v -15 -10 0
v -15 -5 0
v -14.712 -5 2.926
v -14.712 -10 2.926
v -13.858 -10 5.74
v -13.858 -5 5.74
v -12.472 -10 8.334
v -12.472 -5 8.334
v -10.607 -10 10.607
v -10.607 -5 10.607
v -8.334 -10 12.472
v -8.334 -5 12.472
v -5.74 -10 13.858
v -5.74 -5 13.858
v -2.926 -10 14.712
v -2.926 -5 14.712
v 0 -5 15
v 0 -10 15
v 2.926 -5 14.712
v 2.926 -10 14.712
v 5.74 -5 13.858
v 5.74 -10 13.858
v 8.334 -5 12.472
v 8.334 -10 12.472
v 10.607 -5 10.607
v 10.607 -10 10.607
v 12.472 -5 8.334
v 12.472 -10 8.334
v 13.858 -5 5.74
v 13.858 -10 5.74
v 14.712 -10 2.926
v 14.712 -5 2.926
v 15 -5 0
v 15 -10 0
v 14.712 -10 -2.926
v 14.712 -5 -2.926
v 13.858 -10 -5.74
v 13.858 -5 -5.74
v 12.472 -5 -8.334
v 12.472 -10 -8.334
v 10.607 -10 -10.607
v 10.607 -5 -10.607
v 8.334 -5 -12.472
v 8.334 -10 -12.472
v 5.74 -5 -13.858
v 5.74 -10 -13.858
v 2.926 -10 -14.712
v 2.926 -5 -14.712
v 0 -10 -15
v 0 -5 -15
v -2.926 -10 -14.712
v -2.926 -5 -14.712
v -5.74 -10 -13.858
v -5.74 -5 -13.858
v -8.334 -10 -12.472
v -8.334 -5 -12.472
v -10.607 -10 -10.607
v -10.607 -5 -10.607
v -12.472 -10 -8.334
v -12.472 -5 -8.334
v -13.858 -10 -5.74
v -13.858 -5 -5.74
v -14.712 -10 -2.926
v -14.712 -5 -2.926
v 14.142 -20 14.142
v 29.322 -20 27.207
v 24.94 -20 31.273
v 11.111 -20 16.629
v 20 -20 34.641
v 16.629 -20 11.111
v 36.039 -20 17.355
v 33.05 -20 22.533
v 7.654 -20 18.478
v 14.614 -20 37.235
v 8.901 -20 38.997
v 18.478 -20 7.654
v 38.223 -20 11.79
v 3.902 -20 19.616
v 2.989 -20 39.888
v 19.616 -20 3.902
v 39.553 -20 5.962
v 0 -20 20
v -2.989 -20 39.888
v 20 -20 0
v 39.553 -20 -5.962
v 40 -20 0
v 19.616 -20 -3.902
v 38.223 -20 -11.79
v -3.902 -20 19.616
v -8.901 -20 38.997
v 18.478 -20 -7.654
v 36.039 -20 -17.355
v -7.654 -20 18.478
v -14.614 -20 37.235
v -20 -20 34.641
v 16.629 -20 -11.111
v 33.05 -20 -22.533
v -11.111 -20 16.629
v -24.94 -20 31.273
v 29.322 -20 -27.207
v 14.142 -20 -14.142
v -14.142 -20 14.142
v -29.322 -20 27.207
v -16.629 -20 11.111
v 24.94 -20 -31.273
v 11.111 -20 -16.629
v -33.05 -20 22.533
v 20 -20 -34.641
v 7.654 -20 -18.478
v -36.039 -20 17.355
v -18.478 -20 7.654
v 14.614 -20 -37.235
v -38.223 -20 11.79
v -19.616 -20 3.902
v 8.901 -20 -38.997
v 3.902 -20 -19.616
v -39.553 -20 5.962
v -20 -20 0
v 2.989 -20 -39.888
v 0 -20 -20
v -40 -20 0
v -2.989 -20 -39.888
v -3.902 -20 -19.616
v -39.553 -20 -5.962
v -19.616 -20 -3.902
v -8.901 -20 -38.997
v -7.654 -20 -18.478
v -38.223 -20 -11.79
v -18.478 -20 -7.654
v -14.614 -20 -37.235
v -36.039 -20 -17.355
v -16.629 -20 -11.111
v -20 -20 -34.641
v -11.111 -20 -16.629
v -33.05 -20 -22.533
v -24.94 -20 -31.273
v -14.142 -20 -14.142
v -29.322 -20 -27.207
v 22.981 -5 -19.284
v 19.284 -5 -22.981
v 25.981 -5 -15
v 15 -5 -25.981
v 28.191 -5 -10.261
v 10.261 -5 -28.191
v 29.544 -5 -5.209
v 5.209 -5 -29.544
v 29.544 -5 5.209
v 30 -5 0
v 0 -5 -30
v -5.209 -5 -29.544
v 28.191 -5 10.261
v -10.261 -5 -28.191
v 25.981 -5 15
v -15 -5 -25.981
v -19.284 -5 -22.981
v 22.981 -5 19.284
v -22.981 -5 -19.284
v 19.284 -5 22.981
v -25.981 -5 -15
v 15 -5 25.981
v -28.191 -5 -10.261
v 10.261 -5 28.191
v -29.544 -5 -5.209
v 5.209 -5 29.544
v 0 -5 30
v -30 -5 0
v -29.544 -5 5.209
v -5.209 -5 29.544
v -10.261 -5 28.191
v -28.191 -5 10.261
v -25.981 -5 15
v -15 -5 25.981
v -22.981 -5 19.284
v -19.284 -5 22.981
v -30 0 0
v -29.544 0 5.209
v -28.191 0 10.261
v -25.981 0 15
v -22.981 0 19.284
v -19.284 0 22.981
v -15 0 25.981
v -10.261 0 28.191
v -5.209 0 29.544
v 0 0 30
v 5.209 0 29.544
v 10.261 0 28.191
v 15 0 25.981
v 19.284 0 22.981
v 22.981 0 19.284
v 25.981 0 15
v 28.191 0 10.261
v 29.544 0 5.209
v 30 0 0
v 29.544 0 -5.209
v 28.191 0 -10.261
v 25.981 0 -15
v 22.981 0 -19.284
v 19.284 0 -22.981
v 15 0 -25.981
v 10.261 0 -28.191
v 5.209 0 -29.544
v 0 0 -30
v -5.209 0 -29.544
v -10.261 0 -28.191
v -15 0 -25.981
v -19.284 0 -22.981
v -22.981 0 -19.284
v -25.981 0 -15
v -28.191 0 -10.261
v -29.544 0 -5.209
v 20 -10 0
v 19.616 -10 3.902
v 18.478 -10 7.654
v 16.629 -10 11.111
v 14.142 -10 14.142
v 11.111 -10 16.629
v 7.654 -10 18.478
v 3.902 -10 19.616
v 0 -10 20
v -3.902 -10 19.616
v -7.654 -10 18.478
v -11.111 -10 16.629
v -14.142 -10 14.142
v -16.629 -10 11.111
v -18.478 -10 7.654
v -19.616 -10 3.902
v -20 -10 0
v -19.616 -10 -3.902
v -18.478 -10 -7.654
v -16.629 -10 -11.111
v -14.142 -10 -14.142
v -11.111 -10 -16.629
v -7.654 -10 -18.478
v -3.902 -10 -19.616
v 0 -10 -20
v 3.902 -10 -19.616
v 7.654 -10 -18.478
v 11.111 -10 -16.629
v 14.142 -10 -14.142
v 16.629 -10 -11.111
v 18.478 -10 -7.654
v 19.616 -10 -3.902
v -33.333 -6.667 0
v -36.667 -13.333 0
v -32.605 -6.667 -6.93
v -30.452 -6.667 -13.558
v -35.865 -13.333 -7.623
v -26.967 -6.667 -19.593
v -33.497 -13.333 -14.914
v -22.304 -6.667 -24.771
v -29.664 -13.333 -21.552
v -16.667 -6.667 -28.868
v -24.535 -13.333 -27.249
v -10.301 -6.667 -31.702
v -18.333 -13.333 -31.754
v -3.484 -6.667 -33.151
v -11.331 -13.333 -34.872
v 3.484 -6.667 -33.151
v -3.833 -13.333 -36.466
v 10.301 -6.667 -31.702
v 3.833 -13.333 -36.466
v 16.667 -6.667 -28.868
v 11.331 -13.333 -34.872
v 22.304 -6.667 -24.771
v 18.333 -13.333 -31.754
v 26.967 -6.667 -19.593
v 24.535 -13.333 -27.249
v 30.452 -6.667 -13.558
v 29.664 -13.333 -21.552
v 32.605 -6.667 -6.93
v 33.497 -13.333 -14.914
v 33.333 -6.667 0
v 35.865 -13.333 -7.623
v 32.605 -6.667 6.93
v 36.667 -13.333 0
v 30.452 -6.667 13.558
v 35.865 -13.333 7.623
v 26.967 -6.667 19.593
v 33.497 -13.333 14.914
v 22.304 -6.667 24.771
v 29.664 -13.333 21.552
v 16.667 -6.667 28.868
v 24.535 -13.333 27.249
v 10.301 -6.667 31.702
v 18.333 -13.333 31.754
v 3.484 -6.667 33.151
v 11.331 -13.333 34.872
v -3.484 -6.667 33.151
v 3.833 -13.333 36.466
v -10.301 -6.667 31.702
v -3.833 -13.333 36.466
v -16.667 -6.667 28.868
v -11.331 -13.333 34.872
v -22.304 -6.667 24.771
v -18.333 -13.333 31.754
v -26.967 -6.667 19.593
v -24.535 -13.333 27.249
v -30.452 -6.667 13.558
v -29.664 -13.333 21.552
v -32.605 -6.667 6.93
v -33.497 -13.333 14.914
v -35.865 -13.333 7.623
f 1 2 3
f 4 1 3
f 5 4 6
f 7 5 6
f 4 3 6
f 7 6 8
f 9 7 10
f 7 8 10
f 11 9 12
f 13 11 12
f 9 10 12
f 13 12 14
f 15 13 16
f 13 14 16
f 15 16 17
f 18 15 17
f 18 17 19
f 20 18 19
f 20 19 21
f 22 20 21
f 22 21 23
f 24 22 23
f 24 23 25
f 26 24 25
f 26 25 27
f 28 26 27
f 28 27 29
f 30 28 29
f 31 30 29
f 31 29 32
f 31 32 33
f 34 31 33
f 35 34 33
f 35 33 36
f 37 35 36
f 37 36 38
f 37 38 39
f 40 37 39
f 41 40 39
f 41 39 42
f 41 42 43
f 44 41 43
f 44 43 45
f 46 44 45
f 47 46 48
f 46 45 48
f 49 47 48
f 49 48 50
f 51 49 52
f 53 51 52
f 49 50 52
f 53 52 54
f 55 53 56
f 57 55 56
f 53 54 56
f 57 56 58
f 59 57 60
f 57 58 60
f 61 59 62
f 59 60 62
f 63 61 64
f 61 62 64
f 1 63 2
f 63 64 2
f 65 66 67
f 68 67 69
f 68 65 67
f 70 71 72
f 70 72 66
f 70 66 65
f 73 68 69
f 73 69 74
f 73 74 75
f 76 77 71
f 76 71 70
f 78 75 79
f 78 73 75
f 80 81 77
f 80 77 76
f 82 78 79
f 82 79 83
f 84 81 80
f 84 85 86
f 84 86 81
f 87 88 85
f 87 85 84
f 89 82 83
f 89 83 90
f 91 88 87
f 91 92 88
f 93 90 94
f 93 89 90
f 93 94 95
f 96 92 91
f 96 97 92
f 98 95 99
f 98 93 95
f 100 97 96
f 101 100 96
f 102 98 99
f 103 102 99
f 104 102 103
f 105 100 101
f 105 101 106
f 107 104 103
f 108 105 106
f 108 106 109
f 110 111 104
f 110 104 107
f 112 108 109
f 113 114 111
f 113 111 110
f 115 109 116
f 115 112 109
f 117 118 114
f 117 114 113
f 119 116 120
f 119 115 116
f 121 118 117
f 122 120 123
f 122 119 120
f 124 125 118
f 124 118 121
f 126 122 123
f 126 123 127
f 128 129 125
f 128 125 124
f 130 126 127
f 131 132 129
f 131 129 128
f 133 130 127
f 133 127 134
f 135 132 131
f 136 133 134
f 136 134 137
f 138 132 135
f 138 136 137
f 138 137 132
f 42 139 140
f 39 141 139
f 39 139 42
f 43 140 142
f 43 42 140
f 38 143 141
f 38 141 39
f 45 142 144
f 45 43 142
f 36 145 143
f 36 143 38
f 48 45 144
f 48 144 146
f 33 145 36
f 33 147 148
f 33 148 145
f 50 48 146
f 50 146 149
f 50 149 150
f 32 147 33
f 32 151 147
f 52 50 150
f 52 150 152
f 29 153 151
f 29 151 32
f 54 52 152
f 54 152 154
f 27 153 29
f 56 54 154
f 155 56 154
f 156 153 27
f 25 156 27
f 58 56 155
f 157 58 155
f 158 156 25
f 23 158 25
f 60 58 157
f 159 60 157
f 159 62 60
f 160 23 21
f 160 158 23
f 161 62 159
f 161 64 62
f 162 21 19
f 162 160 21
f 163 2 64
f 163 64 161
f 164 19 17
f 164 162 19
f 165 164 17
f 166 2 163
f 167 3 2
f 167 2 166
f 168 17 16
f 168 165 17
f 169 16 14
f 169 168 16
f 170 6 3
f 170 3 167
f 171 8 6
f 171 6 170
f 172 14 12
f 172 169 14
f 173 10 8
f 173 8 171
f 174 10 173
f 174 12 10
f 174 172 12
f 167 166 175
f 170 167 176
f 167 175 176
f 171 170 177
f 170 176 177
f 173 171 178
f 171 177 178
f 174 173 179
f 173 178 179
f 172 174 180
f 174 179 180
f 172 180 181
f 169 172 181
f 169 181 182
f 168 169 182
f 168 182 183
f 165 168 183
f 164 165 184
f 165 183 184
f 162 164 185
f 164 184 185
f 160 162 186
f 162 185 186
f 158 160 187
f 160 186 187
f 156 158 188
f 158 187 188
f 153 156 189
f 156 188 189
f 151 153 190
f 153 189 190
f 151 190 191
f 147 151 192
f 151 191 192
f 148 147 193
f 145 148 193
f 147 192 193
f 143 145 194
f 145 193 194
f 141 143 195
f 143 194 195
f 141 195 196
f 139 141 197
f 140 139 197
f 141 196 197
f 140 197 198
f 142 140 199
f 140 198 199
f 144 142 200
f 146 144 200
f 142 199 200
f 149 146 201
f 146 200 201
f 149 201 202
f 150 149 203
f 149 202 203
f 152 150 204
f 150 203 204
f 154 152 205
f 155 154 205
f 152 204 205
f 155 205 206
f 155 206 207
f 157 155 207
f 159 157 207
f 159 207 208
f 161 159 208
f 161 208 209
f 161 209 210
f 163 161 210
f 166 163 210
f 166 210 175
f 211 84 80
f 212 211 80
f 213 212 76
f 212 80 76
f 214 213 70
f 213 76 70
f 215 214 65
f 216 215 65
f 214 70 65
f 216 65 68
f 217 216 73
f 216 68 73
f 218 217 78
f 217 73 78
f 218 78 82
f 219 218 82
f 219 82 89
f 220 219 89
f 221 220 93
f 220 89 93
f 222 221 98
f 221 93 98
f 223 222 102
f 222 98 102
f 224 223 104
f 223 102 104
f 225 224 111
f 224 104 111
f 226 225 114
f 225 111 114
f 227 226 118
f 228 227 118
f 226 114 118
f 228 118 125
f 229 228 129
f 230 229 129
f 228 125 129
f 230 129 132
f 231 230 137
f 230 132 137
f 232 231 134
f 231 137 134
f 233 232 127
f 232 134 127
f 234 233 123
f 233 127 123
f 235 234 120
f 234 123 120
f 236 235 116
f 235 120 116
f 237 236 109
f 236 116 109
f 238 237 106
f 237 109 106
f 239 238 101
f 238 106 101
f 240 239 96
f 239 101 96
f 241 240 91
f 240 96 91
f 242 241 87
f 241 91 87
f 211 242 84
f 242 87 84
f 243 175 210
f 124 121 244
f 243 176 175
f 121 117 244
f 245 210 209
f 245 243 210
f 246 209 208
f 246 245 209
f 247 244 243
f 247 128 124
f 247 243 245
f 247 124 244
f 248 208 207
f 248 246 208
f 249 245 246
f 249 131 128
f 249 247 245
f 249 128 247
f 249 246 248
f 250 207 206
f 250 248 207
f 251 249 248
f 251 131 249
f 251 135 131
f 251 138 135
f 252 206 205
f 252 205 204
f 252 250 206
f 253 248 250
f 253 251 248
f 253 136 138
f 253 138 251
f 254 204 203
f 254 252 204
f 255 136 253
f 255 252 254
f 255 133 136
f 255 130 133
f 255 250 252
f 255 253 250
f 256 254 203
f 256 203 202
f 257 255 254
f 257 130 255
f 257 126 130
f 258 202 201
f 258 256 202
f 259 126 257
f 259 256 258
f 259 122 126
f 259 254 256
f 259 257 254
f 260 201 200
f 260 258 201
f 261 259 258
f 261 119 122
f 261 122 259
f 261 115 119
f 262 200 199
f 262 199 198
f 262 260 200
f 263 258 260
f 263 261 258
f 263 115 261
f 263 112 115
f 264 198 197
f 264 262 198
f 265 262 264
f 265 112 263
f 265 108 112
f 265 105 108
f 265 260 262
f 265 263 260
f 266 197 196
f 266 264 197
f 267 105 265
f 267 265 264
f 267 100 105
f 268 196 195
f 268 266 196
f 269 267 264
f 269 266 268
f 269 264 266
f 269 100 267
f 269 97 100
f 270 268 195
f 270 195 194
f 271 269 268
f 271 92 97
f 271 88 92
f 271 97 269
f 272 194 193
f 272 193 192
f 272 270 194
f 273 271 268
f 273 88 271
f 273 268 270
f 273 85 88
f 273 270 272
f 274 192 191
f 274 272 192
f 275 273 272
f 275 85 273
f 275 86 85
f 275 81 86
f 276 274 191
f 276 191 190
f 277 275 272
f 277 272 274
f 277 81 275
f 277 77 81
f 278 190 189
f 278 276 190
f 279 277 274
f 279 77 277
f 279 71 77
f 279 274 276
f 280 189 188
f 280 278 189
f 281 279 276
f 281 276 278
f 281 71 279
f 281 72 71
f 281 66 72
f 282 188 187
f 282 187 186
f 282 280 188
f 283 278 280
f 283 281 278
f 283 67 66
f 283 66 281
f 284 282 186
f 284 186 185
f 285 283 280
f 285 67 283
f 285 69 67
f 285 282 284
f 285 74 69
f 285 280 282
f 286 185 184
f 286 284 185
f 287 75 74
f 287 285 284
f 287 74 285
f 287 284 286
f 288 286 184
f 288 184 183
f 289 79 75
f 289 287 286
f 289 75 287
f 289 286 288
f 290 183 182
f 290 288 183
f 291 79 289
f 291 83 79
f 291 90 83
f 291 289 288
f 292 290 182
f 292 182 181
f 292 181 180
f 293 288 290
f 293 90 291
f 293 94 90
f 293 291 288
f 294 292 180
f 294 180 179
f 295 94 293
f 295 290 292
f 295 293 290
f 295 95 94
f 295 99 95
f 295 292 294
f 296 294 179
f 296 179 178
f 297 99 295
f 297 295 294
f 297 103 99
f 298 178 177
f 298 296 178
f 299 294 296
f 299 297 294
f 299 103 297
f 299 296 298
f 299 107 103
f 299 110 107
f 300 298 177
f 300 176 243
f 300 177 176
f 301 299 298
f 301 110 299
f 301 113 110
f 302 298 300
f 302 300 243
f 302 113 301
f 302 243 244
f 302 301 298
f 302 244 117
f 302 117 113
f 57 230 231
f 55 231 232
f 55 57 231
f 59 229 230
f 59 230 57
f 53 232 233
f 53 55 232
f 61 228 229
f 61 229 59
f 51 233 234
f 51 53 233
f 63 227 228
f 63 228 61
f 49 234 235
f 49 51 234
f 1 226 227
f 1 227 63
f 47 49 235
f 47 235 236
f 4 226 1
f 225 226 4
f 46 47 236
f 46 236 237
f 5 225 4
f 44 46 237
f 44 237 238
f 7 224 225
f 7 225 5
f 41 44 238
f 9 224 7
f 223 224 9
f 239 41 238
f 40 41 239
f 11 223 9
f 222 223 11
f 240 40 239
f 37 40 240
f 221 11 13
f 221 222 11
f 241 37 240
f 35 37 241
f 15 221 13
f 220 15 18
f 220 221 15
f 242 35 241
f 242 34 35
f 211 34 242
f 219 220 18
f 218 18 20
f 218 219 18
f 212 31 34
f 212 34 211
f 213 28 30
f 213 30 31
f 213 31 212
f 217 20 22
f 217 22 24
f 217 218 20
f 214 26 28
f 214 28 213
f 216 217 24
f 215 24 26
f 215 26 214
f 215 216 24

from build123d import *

# Parameters (mm, degrees)
CROQUIS3_R            = 30
CORTAR_EXTRUIR1_DEPTH = 5
CROQUIS4_R            = 15
CORTAR_EXTRUIR2_DEPTH = 59.523499554
CROQUIS5_R            = 20
CORTAR_EXTRUIR3_DEPTH = 10


with BuildPart() as part:
    # Croquis2 → Revolución1 (revolve)
    with BuildSketch(Plane.XY, mode=Mode.PRIVATE) as revoluci_n1_sk:
        Polygon((0, 0), (30, 0), (40, -20), (0, -20), align=None)
    revolve(revoluci_n1_sk.sketch.rotate(Axis((0, 0, 0), (0, -1, 0)), 180), axis=Axis((0, 0, 0), (0, -1, 0)))

    # Croquis3 → Cortar-Extruir1 (cut)
    with BuildSketch(Plane(origin=(0, 0, 0), x_dir=(1, 0, 0), z_dir=(0, 1, 0))):
        with Locations(Location((0, 0, 0), (0, 0, 180))):
            Circle(CROQUIS3_R)
    extrude(amount=-CORTAR_EXTRUIR1_DEPTH, mode=Mode.SUBTRACT)

    # Croquis4 → Cortar-Extruir2 (cut, through all)
    with BuildSketch(Plane(origin=(0, -5, 0), x_dir=(1, 0, 0), z_dir=(0, 1, 0))):
        with Locations(Location((0, 0, 0), (0, 0, 180))):
            Circle(CROQUIS4_R)
    extrude(amount=-CORTAR_EXTRUIR2_DEPTH, mode=Mode.SUBTRACT)

    # Croquis5 → Cortar-Extruir3 (cut)
    with BuildSketch(Plane.XZ.offset(20)):
        Circle(CROQUIS5_R)
    extrude(amount=-CORTAR_EXTRUIR3_DEPTH, mode=Mode.SUBTRACT)


solid = part.part
